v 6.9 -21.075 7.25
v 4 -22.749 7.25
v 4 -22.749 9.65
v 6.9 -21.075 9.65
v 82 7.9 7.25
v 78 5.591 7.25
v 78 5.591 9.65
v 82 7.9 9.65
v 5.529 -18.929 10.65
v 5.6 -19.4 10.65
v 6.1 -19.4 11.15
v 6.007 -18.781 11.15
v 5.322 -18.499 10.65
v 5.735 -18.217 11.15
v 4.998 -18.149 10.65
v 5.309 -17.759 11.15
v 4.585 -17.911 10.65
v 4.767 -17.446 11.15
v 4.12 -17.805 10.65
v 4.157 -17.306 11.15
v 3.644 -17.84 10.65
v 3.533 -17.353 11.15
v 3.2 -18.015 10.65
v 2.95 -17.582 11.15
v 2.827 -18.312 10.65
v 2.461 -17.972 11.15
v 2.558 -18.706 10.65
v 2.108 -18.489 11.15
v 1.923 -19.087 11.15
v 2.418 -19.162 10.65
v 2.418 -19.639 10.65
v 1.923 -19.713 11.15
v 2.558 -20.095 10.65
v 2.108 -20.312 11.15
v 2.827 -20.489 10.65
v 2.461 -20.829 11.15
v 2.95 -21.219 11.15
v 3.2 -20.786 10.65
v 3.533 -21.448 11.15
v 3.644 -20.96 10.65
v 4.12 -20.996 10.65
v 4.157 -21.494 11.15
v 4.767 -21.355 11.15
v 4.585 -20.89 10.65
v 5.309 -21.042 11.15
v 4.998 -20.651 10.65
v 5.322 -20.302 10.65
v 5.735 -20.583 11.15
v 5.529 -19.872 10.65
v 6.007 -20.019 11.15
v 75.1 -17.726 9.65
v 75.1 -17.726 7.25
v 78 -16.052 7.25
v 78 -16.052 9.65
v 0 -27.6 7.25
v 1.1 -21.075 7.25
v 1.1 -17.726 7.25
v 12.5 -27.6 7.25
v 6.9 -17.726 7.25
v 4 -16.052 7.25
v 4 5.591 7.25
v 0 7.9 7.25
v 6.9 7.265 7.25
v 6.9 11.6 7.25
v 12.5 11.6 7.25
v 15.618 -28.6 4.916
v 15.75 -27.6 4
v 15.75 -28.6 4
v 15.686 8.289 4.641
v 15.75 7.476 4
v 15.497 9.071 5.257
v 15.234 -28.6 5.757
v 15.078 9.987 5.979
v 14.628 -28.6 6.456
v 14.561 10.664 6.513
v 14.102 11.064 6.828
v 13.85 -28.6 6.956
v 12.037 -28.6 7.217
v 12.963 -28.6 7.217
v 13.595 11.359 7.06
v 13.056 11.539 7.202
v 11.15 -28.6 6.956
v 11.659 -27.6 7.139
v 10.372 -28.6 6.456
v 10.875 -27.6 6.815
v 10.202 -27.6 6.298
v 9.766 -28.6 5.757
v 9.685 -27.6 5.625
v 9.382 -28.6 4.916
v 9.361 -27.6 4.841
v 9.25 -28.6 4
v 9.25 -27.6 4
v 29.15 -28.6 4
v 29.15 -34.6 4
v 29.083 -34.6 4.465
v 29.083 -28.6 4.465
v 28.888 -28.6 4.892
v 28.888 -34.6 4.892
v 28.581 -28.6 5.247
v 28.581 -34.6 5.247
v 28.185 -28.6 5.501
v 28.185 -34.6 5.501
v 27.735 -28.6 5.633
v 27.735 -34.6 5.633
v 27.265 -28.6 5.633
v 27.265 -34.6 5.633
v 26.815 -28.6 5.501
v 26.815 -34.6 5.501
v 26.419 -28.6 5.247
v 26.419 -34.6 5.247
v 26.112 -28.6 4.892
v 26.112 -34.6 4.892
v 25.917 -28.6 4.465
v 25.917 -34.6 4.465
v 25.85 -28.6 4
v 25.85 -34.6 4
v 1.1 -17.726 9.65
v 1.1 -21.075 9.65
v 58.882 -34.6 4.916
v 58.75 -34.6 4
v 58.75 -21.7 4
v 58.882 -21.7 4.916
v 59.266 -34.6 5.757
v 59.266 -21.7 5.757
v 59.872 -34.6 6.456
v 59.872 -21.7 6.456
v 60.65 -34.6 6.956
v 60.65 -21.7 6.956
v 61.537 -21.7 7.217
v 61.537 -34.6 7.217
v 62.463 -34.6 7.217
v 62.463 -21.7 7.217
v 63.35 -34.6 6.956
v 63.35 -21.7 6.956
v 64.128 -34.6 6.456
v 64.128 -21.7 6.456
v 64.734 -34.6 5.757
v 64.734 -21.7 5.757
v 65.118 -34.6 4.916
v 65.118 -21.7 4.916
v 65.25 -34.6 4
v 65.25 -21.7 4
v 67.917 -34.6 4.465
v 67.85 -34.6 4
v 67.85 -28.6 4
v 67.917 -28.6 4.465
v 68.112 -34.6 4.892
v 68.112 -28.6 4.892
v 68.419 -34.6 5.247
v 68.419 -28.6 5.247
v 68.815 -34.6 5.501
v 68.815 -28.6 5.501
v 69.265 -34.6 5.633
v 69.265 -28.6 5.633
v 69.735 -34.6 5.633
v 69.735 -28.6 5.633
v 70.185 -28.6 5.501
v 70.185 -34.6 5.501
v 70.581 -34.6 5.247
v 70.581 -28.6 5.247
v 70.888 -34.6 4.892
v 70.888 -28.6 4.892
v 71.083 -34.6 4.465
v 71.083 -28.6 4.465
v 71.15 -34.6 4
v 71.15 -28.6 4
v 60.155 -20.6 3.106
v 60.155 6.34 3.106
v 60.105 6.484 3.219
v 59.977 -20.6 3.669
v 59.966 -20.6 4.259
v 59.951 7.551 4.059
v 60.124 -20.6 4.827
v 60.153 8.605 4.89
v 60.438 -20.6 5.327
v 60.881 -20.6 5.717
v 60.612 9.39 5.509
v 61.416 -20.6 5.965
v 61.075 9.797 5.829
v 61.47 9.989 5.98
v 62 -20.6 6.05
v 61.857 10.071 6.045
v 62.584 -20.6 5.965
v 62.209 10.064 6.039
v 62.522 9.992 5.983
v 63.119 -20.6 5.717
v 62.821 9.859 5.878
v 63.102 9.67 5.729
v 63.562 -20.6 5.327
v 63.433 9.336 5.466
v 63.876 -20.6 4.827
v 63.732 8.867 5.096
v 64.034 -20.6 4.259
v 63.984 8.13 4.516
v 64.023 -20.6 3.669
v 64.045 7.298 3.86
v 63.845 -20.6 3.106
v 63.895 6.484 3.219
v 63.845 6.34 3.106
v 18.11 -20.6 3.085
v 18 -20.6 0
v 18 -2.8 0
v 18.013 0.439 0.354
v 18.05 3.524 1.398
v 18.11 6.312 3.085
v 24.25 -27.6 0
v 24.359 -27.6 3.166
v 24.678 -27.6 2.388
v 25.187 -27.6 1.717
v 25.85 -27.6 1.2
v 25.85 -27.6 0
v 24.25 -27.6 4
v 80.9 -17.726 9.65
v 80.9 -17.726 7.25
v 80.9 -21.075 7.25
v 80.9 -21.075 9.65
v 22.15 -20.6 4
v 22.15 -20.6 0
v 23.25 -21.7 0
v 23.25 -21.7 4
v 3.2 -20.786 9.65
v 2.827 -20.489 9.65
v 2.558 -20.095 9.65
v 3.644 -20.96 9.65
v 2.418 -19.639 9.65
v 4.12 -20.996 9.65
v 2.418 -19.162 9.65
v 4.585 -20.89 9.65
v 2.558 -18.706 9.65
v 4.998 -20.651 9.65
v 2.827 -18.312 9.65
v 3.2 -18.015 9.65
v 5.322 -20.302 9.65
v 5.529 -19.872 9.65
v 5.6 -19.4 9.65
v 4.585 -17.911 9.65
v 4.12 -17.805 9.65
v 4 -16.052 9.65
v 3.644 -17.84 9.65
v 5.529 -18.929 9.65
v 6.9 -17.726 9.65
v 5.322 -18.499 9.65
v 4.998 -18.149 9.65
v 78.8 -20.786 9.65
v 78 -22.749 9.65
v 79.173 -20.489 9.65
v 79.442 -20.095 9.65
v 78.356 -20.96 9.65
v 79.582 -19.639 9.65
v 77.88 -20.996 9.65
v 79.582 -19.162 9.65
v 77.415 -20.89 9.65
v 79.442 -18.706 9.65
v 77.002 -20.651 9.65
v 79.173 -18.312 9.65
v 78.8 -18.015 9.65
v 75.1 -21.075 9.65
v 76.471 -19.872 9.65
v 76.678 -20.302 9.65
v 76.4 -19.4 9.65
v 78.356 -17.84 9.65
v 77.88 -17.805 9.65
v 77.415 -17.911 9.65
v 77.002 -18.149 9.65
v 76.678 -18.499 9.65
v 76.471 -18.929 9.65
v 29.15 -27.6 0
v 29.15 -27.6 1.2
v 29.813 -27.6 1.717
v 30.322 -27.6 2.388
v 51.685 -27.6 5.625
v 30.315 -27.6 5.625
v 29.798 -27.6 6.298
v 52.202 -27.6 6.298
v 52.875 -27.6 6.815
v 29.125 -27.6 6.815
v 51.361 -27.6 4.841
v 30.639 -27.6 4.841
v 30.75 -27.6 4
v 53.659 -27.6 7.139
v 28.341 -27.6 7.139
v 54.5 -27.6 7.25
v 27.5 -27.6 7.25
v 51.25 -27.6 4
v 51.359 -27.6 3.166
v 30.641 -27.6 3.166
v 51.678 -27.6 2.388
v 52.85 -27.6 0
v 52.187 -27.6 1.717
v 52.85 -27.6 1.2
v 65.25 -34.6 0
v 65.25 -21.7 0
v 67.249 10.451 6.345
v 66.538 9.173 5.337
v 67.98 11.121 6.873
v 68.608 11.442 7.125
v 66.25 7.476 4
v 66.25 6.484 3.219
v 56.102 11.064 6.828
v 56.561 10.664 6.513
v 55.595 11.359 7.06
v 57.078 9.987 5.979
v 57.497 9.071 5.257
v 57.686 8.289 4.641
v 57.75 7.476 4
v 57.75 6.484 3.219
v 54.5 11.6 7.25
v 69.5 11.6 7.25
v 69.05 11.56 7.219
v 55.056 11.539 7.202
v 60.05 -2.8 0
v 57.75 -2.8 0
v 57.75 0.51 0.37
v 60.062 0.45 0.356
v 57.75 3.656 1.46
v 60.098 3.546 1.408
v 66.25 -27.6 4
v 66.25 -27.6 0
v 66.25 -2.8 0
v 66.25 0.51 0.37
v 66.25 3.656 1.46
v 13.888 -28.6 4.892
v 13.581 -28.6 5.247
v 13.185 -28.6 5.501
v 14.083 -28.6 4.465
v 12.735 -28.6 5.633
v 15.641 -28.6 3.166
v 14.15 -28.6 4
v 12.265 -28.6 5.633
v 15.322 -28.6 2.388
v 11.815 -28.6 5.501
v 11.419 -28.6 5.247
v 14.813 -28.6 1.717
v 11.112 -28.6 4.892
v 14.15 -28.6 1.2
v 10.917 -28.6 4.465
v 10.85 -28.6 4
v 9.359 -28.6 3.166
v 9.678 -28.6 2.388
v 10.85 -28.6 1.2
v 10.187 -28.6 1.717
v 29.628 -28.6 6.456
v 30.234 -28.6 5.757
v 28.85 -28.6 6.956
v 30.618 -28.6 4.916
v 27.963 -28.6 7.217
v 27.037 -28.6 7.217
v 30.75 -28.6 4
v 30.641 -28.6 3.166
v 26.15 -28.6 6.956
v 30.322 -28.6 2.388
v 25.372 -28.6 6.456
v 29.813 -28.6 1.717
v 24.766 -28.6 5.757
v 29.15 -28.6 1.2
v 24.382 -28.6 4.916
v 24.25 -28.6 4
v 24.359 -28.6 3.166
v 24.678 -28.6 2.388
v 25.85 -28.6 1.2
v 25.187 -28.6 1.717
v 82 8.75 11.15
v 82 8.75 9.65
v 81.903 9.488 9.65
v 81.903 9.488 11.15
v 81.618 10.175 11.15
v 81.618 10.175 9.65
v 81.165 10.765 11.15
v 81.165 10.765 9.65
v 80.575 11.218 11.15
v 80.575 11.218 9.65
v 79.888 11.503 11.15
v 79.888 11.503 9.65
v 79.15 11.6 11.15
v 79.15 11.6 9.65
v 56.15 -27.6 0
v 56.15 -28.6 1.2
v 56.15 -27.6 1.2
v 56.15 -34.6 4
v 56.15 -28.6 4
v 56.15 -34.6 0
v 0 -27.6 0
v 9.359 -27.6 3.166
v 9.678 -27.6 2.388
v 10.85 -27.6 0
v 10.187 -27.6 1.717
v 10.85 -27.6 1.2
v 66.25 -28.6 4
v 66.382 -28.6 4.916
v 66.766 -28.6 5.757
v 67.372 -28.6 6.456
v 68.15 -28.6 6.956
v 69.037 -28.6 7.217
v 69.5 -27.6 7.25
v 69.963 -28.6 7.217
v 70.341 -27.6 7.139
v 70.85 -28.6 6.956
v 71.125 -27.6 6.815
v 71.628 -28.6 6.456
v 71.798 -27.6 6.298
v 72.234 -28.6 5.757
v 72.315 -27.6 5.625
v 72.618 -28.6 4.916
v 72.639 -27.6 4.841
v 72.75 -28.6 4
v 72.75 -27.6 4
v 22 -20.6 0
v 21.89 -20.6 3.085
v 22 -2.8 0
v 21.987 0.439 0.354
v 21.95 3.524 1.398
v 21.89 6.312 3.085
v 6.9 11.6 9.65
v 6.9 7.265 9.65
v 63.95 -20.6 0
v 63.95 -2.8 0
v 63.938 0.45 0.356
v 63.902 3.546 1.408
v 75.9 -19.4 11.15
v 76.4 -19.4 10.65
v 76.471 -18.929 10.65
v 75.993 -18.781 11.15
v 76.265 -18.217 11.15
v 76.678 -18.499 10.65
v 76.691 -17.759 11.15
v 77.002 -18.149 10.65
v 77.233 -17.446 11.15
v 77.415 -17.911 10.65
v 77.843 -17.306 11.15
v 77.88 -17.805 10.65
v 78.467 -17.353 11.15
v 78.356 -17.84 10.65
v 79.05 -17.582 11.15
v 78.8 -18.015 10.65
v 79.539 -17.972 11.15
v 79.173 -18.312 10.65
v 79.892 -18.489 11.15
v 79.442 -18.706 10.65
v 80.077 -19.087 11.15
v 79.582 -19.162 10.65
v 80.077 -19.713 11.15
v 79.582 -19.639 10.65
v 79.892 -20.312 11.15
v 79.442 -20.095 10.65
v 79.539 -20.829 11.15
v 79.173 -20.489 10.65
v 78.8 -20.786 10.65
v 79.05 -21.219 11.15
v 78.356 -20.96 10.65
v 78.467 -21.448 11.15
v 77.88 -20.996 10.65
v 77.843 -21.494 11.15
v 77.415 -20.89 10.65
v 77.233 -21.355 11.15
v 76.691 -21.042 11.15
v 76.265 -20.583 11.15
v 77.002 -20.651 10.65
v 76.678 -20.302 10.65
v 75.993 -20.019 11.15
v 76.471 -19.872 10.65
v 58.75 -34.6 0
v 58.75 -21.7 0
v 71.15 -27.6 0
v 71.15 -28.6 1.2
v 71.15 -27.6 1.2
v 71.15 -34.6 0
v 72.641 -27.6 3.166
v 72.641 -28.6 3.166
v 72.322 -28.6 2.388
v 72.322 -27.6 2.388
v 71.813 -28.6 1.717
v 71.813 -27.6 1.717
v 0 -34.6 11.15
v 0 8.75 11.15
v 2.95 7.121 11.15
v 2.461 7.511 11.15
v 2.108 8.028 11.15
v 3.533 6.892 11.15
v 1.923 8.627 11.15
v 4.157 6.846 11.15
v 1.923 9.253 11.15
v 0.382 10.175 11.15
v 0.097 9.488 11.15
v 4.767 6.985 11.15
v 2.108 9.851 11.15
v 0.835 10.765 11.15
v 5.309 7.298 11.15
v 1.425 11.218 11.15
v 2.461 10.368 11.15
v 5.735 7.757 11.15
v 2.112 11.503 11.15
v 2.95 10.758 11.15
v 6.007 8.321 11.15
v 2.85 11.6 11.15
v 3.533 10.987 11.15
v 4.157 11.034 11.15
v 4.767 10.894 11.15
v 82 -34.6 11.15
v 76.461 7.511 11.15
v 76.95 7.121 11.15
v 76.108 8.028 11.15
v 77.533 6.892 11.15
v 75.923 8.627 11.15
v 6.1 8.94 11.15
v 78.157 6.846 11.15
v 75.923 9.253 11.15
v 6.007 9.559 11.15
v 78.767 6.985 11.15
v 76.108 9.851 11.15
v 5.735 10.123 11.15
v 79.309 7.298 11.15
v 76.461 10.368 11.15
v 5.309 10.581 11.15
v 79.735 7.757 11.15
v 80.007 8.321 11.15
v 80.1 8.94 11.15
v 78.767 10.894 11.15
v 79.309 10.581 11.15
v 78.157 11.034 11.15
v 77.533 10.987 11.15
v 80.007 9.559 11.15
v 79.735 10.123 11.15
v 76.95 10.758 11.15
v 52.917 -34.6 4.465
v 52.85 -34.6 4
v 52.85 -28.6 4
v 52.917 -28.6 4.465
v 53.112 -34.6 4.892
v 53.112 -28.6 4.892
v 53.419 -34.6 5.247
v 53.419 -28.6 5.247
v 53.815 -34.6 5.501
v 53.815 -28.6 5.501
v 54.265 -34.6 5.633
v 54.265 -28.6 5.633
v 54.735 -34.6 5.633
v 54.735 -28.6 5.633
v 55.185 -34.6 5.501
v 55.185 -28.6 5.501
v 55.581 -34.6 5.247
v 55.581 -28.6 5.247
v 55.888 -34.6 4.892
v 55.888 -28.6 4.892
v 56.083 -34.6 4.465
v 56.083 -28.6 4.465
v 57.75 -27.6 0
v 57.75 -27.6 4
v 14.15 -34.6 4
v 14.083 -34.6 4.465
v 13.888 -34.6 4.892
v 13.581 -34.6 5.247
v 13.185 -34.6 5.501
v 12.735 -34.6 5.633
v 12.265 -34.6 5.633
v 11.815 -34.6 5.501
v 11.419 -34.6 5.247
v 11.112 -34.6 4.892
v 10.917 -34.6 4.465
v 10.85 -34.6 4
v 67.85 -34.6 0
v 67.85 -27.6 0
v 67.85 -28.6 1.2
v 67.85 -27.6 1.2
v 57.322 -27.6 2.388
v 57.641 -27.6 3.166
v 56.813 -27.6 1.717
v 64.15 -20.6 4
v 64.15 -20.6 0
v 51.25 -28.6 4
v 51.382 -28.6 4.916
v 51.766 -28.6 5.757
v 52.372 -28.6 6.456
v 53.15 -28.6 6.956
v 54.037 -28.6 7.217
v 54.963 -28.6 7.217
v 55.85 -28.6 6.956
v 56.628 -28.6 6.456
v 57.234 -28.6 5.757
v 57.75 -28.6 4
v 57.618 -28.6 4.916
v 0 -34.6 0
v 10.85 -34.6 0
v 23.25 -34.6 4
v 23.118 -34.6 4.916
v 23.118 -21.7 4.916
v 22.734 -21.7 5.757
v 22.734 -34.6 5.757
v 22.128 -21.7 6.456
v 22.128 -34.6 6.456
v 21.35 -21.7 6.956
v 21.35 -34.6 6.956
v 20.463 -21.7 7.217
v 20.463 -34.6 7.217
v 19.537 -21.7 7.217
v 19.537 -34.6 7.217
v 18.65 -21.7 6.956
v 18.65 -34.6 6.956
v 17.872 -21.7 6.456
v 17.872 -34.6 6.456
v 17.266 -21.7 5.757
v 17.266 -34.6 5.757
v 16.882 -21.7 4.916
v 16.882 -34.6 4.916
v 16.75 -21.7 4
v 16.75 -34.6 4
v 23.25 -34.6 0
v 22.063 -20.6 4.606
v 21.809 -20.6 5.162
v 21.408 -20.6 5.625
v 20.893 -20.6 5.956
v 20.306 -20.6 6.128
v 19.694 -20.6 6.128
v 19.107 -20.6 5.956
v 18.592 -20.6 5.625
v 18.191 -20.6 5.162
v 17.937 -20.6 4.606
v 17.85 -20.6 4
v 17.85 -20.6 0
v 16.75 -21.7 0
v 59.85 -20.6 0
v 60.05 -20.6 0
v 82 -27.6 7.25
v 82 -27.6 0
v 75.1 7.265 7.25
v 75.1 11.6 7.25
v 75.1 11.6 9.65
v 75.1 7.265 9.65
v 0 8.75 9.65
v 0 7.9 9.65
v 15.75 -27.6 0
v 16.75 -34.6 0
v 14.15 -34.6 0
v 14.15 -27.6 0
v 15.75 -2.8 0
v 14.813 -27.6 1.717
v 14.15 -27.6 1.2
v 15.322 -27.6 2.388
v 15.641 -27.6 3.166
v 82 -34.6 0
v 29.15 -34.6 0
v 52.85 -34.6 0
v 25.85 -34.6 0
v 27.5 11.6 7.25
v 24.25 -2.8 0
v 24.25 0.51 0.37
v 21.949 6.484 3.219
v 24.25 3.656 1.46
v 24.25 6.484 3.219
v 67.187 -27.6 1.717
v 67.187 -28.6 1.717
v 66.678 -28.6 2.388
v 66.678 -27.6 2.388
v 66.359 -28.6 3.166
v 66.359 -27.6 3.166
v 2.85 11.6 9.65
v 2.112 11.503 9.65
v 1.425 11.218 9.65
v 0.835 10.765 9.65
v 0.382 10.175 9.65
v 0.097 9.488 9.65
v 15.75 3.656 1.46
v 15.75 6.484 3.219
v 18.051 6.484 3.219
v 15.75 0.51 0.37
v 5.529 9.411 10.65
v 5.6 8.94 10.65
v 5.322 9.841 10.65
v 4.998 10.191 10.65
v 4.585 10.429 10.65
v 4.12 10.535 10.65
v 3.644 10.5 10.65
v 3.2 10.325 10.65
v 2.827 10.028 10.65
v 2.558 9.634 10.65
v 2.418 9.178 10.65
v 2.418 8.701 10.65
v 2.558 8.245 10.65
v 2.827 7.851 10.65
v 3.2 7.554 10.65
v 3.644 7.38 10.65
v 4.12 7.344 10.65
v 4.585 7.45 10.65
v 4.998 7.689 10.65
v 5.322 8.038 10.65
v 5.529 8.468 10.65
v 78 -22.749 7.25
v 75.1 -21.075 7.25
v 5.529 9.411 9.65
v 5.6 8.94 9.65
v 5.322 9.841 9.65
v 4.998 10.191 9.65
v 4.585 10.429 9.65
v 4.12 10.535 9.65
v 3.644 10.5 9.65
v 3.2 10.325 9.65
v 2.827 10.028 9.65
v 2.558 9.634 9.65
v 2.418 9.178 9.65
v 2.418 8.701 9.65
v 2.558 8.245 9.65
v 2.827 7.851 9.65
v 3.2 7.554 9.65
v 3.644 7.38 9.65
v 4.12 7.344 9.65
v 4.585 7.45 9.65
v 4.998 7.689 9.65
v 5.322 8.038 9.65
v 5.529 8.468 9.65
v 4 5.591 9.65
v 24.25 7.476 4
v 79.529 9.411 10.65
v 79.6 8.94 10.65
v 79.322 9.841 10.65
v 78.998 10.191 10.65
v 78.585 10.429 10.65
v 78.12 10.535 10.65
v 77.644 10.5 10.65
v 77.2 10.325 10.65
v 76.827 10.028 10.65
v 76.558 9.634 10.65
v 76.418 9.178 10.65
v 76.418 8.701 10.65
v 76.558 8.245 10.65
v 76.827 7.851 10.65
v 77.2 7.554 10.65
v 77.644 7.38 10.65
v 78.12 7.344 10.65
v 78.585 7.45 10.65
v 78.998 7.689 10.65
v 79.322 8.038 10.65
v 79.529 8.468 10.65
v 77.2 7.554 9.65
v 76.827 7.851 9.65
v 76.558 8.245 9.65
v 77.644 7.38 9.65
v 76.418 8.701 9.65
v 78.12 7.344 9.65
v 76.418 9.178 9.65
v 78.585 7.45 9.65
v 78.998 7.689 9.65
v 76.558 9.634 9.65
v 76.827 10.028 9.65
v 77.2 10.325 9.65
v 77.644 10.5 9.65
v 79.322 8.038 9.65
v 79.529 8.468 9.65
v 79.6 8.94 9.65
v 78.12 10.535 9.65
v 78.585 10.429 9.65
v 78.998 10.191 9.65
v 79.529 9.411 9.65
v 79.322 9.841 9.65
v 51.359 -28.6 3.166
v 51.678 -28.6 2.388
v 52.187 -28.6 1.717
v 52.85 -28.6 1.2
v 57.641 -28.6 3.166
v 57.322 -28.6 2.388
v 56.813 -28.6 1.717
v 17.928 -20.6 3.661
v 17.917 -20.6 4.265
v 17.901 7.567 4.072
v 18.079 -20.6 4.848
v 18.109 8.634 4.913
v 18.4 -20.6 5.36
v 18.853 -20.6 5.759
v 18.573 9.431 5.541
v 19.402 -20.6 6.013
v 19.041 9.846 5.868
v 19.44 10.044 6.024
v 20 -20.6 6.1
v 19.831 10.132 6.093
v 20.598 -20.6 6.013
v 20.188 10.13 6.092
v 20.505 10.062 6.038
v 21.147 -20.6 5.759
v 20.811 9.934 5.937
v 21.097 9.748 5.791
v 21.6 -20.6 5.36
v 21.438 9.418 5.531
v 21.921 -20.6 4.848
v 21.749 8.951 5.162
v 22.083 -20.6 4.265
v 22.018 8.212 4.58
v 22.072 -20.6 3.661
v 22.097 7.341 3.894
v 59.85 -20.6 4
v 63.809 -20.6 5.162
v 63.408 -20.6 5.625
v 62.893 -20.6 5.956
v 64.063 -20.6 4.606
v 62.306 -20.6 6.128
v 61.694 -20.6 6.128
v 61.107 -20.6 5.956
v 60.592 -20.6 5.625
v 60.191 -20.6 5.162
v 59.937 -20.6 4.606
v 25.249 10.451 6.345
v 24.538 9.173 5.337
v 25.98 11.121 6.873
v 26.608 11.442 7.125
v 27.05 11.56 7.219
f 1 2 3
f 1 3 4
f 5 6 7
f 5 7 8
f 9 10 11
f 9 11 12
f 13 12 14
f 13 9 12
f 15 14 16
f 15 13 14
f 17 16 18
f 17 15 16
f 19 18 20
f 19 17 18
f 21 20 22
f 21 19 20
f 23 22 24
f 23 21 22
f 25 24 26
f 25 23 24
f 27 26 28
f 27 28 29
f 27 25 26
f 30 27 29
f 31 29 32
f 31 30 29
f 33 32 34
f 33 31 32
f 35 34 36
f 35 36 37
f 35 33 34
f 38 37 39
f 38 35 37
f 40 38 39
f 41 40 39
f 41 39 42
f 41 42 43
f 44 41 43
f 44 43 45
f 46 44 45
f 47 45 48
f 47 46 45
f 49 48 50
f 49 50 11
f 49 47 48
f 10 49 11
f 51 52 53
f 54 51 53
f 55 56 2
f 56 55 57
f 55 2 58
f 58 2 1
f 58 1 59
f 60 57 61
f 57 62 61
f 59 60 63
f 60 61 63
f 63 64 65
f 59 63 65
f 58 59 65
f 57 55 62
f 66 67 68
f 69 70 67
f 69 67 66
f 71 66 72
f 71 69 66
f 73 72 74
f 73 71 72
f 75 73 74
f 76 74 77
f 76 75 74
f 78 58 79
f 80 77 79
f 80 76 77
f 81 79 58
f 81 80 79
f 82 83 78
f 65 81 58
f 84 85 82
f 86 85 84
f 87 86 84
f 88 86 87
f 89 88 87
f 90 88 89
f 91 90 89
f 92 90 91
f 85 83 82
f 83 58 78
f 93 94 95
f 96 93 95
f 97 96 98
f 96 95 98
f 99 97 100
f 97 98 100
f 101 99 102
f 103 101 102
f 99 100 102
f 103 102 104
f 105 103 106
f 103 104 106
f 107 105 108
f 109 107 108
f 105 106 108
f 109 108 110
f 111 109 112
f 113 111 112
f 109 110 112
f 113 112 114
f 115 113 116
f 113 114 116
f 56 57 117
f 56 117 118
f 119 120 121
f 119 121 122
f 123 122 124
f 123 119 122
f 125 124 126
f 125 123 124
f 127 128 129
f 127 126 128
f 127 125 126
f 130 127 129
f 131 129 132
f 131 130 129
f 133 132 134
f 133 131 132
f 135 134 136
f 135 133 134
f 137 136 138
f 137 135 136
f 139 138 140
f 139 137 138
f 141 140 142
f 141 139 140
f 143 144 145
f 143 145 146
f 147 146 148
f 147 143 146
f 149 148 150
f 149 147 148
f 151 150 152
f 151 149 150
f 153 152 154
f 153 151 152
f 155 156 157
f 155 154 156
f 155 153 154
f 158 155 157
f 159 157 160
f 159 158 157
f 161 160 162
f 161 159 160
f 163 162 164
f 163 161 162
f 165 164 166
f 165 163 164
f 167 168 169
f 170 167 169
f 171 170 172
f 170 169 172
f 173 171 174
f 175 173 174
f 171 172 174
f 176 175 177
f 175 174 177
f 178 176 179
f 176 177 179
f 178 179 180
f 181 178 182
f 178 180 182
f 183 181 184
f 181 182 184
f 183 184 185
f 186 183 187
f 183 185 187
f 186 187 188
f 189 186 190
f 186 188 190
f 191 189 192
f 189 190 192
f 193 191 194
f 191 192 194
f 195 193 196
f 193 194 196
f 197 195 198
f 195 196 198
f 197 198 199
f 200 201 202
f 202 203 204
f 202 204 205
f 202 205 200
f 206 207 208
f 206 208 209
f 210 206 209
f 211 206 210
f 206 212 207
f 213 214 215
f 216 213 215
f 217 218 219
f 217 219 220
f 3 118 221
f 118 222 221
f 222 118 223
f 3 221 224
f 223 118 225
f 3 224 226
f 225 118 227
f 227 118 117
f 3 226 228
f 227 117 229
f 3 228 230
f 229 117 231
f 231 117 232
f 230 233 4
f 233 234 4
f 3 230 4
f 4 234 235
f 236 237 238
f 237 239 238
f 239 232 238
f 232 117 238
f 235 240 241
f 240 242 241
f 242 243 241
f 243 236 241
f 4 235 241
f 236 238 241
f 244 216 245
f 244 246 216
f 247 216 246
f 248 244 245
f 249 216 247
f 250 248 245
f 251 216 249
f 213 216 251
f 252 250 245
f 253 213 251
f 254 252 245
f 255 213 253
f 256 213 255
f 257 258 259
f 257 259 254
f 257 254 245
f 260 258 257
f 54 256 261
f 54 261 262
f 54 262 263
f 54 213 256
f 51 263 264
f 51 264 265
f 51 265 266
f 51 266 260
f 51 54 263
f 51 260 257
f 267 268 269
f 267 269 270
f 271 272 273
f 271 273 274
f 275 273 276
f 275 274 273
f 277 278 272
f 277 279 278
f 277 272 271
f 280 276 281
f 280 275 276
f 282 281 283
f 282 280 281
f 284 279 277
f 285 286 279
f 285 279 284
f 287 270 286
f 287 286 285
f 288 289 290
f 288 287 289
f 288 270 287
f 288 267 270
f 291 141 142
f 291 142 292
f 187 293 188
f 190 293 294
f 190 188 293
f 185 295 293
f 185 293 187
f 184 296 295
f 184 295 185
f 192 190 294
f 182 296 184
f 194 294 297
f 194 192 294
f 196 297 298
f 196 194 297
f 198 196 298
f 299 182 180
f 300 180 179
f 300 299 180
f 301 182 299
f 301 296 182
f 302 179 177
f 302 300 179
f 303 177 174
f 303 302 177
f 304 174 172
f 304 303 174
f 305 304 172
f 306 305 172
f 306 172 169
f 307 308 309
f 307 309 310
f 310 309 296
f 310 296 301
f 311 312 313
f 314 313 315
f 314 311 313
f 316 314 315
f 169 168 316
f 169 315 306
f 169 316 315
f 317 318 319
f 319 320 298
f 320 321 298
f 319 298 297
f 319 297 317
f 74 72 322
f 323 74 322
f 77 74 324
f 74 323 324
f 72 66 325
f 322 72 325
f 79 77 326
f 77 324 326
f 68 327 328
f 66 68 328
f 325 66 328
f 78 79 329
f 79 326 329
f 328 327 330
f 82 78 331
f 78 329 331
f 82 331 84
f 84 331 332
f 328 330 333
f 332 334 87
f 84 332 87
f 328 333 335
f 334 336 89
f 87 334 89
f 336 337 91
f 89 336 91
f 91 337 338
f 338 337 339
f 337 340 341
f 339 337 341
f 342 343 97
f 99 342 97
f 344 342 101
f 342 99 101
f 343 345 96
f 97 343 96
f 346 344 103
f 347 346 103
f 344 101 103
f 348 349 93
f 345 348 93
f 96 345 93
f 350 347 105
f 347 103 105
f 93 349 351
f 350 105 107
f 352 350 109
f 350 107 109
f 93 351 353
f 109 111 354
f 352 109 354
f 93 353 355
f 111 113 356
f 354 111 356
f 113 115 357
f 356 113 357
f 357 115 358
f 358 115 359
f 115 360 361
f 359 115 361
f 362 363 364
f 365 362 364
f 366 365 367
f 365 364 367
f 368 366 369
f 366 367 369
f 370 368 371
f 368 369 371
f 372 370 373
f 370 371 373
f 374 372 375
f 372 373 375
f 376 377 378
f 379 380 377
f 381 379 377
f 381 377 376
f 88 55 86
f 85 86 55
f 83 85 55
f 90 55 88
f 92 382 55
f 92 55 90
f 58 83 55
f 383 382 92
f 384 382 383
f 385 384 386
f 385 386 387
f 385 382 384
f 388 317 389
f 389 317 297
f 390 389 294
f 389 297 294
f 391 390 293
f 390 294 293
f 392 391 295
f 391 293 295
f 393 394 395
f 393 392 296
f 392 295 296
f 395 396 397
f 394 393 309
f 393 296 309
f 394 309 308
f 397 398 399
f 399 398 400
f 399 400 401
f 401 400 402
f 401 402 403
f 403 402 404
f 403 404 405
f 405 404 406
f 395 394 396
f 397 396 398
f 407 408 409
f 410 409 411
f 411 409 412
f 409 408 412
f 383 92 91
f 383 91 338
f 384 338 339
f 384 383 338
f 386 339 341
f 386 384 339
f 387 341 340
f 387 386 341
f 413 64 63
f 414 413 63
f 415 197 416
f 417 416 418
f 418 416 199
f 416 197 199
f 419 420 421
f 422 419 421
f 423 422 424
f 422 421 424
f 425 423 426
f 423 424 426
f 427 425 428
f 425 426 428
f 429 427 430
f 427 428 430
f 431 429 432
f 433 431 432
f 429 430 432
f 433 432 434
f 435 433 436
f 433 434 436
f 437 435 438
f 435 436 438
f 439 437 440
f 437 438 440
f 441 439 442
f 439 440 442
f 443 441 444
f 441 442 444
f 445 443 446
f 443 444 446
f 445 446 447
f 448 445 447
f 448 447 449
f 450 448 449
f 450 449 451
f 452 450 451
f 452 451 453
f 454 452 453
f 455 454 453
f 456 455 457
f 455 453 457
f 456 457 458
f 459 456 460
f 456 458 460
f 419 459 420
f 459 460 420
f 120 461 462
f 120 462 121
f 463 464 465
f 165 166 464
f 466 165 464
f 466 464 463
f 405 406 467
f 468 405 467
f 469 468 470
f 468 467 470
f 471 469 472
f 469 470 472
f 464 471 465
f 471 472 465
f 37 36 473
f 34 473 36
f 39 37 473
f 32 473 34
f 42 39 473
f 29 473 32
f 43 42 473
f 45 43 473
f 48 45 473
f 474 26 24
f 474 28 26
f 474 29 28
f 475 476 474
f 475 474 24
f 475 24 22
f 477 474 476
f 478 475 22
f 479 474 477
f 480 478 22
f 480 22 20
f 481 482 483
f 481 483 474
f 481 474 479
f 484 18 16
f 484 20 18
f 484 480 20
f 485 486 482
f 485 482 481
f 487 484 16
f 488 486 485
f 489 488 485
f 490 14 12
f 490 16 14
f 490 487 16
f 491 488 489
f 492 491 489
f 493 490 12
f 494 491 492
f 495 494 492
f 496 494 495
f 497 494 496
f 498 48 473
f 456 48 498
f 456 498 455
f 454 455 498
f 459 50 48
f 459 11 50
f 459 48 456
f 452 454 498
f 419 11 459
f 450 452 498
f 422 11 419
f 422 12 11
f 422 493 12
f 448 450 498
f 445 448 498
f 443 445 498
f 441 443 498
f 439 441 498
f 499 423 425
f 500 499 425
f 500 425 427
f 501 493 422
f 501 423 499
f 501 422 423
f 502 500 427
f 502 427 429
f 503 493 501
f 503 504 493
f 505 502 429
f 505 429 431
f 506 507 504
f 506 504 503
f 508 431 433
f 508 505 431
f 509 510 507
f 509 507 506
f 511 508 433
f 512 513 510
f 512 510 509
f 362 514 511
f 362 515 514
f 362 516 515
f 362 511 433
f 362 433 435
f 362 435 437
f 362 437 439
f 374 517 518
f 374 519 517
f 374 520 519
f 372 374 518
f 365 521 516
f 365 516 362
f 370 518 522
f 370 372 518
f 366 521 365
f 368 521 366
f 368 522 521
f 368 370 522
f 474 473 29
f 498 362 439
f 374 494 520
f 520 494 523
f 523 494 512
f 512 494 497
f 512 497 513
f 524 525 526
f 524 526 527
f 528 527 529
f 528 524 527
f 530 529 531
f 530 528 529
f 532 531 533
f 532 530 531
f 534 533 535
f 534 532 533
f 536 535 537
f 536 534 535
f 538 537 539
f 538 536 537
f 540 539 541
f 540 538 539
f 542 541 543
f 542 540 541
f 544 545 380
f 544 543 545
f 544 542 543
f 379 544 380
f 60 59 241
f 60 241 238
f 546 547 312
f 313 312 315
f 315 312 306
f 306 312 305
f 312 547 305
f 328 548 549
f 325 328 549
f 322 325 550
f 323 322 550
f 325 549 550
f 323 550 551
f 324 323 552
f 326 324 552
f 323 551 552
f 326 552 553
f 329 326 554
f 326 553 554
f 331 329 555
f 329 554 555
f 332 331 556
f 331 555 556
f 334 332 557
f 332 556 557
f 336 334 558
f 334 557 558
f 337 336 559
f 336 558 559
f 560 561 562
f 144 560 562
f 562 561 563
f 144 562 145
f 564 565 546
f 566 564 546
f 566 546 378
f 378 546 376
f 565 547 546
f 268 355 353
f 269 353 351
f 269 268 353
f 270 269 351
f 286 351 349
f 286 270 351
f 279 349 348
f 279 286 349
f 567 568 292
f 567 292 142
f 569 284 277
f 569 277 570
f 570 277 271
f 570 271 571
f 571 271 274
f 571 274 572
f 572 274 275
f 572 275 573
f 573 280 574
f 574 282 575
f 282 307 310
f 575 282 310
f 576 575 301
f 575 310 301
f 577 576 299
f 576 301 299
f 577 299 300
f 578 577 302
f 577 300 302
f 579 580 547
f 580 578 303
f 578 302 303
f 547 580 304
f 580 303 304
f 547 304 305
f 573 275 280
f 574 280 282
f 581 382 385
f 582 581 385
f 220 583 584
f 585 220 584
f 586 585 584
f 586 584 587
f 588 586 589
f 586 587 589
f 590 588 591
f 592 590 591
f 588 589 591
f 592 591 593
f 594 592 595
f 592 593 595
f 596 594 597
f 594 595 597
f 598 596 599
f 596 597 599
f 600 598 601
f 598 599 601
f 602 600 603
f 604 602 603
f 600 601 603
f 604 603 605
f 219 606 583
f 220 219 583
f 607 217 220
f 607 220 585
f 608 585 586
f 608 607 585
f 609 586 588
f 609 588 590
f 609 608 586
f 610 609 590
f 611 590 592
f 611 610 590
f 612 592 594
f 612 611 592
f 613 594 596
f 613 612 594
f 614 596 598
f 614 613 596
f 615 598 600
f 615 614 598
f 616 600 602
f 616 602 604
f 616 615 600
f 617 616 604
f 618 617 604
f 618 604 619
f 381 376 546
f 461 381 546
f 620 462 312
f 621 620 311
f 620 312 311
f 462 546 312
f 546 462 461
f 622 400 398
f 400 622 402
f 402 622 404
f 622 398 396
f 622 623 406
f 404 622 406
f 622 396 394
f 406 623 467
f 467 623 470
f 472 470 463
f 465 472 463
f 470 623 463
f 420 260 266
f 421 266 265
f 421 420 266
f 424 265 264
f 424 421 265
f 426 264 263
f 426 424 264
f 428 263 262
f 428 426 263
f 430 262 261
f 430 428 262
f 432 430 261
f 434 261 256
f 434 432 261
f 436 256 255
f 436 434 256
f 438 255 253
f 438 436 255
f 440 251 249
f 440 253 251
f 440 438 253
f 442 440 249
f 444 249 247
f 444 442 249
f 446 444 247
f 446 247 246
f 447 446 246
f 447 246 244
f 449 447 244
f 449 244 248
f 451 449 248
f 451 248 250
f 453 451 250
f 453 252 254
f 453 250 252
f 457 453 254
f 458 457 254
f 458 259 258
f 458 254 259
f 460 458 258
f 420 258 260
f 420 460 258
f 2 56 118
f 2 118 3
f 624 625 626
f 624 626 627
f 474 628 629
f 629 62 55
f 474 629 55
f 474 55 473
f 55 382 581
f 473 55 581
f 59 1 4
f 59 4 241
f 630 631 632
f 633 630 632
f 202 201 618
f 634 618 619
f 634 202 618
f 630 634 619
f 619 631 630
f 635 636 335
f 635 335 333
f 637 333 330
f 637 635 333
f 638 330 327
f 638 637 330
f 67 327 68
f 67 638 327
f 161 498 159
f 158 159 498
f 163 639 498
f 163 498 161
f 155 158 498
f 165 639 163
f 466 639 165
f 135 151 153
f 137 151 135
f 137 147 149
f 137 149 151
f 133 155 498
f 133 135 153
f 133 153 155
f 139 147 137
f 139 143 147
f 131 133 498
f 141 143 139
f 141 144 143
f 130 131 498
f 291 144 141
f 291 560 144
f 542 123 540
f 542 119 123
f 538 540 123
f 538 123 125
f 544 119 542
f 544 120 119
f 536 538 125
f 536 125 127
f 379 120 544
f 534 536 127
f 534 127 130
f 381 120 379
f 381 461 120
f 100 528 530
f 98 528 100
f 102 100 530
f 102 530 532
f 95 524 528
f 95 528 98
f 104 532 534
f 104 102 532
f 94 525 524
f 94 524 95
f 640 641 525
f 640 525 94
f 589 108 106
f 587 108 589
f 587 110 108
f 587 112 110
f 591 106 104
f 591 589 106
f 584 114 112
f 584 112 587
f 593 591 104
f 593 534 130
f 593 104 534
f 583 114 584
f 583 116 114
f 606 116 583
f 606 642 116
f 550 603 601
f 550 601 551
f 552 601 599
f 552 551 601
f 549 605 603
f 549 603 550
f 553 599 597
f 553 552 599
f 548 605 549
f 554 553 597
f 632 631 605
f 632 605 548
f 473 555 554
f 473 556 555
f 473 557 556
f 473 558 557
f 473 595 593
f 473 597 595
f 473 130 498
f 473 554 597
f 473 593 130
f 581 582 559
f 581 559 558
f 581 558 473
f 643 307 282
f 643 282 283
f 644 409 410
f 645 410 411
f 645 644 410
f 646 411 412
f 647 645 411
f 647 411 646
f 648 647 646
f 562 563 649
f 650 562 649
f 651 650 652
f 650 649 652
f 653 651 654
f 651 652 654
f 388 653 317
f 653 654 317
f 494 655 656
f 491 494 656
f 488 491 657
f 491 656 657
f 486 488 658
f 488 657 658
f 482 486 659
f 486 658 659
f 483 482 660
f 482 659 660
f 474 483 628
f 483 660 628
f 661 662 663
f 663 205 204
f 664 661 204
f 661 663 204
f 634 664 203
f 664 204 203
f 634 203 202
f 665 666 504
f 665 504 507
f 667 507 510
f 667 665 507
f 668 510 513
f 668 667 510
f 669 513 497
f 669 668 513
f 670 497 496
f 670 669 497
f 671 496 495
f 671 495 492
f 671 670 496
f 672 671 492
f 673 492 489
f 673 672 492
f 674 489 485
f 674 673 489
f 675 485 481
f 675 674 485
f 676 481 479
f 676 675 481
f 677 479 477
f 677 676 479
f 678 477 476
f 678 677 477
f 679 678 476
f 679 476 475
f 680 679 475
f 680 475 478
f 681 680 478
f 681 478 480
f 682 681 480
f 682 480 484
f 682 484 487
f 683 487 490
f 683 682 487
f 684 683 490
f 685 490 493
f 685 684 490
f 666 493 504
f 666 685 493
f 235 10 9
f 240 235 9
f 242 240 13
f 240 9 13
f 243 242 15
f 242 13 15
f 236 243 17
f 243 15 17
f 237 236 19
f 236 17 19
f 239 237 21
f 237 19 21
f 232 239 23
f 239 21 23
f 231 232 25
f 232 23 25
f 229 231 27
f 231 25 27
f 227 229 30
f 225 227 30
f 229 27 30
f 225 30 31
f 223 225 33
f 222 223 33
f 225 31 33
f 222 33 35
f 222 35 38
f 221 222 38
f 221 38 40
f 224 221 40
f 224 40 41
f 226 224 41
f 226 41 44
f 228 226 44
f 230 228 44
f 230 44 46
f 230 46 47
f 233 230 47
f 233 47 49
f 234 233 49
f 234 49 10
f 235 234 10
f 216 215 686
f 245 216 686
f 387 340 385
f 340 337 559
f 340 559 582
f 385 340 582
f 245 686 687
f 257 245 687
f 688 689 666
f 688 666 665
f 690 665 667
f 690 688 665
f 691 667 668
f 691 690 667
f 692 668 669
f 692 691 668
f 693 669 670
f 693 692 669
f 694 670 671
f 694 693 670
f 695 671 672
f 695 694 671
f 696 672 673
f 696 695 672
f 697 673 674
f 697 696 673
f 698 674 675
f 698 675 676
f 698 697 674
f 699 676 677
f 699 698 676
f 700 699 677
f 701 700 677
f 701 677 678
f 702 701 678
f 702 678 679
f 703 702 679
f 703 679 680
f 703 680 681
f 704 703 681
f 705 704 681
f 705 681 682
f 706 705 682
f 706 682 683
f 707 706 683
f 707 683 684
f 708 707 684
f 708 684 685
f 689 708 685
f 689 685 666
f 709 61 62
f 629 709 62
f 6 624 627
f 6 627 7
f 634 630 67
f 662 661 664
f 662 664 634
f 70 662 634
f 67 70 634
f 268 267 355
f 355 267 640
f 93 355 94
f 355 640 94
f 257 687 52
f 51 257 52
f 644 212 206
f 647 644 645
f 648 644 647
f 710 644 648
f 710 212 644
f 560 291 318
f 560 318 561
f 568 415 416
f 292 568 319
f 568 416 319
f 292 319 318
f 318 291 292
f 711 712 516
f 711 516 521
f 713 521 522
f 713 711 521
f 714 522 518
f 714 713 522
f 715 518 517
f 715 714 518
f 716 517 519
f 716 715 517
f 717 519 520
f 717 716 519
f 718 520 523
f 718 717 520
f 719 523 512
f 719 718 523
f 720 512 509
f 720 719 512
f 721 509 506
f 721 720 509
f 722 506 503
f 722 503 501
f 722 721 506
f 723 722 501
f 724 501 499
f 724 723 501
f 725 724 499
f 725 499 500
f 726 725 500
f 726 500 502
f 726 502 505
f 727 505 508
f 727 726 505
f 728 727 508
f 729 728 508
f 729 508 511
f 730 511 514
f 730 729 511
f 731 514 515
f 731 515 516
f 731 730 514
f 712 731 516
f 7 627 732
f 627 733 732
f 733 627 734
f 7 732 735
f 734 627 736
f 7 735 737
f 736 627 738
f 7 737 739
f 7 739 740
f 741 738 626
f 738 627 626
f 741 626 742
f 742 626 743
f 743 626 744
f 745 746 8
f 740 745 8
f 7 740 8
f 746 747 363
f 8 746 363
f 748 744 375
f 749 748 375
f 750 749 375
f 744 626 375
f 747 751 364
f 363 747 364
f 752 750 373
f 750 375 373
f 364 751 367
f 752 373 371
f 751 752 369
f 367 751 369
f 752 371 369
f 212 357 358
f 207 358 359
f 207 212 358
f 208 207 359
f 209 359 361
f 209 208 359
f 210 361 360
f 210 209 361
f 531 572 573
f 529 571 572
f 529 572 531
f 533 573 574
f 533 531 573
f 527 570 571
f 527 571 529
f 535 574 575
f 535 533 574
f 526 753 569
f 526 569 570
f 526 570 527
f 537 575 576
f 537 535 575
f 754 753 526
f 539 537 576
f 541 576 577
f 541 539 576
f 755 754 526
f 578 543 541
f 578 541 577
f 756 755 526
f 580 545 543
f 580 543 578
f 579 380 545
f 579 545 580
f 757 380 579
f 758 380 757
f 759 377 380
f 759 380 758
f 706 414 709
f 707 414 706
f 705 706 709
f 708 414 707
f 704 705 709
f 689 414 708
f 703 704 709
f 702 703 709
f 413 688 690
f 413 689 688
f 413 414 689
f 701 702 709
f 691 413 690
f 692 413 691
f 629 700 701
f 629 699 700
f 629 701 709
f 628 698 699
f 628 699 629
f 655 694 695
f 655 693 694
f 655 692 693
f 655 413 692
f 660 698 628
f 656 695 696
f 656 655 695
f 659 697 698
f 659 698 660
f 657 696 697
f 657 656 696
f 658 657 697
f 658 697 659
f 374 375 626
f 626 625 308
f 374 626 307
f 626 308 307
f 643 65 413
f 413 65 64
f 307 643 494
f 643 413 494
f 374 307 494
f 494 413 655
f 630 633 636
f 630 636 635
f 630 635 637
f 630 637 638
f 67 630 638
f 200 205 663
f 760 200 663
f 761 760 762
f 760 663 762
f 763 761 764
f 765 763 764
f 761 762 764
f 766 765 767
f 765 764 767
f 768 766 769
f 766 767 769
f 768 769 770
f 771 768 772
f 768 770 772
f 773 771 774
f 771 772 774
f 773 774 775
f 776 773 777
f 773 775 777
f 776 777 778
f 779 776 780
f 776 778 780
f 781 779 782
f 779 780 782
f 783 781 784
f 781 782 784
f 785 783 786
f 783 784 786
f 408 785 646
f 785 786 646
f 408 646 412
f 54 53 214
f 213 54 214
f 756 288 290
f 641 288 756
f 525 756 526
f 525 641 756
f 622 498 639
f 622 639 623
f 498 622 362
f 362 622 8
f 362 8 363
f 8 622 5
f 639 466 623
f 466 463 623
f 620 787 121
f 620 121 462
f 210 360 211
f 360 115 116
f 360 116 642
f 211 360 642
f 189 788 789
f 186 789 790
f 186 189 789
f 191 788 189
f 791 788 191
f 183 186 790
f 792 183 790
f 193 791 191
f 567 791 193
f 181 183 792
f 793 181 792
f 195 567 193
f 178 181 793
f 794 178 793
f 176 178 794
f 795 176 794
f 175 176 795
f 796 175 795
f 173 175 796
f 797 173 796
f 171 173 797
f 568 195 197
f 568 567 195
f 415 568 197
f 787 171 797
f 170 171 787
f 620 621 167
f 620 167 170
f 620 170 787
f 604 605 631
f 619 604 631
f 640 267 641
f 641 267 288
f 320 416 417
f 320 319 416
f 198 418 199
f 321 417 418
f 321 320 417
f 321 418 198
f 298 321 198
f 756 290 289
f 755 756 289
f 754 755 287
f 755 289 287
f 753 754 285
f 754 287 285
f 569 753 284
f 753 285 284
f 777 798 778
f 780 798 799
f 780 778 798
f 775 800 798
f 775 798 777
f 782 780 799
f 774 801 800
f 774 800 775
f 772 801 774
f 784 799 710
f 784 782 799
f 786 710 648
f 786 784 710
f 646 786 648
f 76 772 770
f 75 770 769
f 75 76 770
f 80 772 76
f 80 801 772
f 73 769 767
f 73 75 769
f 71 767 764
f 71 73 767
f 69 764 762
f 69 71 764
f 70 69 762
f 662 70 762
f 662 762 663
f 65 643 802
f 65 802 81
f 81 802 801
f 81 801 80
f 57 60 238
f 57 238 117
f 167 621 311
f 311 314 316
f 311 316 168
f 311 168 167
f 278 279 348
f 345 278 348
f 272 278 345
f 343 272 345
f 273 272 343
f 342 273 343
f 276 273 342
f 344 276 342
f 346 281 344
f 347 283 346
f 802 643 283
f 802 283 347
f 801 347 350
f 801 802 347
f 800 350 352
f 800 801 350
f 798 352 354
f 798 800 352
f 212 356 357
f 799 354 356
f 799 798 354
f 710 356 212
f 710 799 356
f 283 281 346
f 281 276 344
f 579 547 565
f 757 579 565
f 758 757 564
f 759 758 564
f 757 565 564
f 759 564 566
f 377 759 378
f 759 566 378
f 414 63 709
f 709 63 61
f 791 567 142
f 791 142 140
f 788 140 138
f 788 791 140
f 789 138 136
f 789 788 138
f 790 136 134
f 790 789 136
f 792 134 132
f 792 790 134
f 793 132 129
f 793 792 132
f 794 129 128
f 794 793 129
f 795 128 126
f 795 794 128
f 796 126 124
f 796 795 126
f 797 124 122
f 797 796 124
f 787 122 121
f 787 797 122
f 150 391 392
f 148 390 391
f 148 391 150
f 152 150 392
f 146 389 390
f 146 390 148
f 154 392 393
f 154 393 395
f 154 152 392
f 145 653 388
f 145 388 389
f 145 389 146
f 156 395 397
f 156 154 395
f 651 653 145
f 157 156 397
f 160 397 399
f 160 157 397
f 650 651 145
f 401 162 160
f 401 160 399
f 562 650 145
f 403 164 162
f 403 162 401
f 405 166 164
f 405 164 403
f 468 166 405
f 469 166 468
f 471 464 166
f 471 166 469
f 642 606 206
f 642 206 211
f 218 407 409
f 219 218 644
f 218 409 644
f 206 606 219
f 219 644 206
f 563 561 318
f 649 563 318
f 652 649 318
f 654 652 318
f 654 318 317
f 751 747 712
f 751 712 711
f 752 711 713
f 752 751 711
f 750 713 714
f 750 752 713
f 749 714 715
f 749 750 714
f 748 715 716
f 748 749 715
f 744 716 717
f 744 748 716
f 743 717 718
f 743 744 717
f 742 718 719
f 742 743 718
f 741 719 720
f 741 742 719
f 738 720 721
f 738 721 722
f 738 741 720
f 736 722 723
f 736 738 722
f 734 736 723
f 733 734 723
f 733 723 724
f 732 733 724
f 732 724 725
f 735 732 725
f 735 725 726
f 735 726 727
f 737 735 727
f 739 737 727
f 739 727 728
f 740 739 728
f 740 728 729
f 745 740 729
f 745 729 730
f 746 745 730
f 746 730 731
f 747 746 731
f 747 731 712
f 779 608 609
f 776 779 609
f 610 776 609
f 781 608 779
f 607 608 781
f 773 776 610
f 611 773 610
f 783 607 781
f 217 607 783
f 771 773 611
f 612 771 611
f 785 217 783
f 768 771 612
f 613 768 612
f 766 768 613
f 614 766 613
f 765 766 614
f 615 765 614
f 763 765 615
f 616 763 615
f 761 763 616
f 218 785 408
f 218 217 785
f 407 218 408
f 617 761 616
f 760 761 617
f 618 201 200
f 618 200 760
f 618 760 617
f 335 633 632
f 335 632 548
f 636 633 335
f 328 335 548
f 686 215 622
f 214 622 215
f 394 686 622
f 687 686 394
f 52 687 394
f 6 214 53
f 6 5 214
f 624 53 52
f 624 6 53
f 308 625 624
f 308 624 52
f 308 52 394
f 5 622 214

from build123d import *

# Parameters (mm, degrees)
SKETCH1_R                = 1.6
BOSS_EXTRUDE1_DEPTH      = 11.15
SKETCH2_W                = 82
SKETCH2_H                = 0.6
CUT_EXTRUDE1_DEPTH       = 8
CUT_EXTRUDE2_DEPTH       = 46.2
CUT_EXTRUDE3_DEPTH       = 40.2
CUT_EXTRUDE5_DEPTH       = 39.2
BOSS_EXTRUDE2_DEPTH      = 32.2
CHAMFER3_SIZE            = 1.1
CHAMFER4_SIZE            = 1.1
CUT_EXTRUDE12_DEPTH      = 1
CUT_EXTRUDE12_DEPTH_BACK = 83
FILLET3_R                = 15
SKETCH14_R               = 1.6
CUT_EXTRUDE14_DEPTH      = 12.1500001
BOSS_EXTRUDE3_DEPTH      = 3.5
SKETCH8_W                = 82
SKETCH8_H                = 0.6
CUT_EXTRUDE16_DEPTH      = 4.15
CUT_EXTRUDE17_DEPTH      = 2.4
CHAMFER5_SIZE            = 0.5


with BuildPart() as part:
    # Sketch1 → Boss-Extrude1 (new body)
    with BuildSketch(Plane.XY):
        with BuildLine():
            Line((0, -35.2), (82, -35.2))
            Line((82, -35.2), (82, 8.75))
            ThreePointArc((82, 8.75), (81.165254326, 10.765254326), (79.15, 11.6))
            Line((79.15, 11.6), (2.85, 11.6))
            ThreePointArc((2.85, 11.6), (0.834745674, 10.765254326), (0, 8.75))
            Line((0, 8.75), (0, -35.2))
        make_face()
        with Locations((4, 8.939640599)):
            Circle(SKETCH1_R, mode=Mode.SUBTRACT)
        with Locations((78, 8.939640599)):
            Circle(SKETCH1_R, mode=Mode.SUBTRACT)
    extrude(amount=BOSS_EXTRUDE1_DEPTH)

    # Sketch2 → Cut-Extrude1 (cut)
    with BuildSketch(Plane(origin=(0, 0, 0), x_dir=(-1, 0, 0), z_dir=(0, 0, -1))):
        with Locations((-41, -34.9)):
            Rectangle(SKETCH2_W, SKETCH2_H)
    cut_extrude1 = extrude(amount=-CUT_EXTRUDE1_DEPTH, mode=Mode.SUBTRACT)

    # Sketch3 → Cut-Extrude2 (cut)
    with BuildSketch(Plane.XZ.offset(34.6)):
        with BuildLine():
            Line((25.85, 4), (25.85, 0))
            Line((25.85, 0), (29.15, 0))
            Line((29.15, 0), (29.15, 4))
            ThreePointArc((29.15, 4), (27.5, 5.65), (25.85, 4))
        make_face()
        with BuildLine():
            ThreePointArc((14.15, 4), (12.5, 5.65), (10.85, 4))
            Line((10.85, 4), (10.85, 0))
            Line((10.85, 0), (14.15, 0))
            Line((14.15, 0), (14.15, 4))
        make_face()
        with BuildLine():
            ThreePointArc((23.25, 4), (20, 7.25), (16.75, 4))
            Line((16.75, 4), (16.75, 0))
            Line((16.75, 0), (23.25, 0))
            Line((23.25, 0), (23.25, 4))
        make_face()
    cut_extrude2 = extrude(amount=-CUT_EXTRUDE2_DEPTH, mode=Mode.SUBTRACT)

    # Sketch4 → Cut-Extrude3 (cut)
    with BuildSketch(Plane(origin=(0, 11.6, 0), x_dir=(1, 0, 0), z_dir=(0, 1, 0))):
        with BuildLine():
            Line((9.25, -4), (9.25, 0))
            Line((9.25, 0), (15.75, 0))
            Line((15.75, 0), (15.75, -4))
            ThreePointArc((15.75, -4), (12.5, -7.25), (9.25, -4))
        make_face()
        with BuildLine():
            Line((24.25, -4), (24.25, 0))
            Line((24.25, 0), (30.75, 0))
            Line((30.75, 0), (30.75, -4))
            ThreePointArc((30.75, -4), (27.5, -7.25), (24.25, -4))
        make_face()
    cut_extrude3 = extrude(amount=-CUT_EXTRUDE3_DEPTH, mode=Mode.SUBTRACT)

    # Sketch6 → Cut-Extrude5 (cut)
    with BuildSketch(Plane(origin=(0, 11.6, 0), x_dir=(1, 0, 0), z_dir=(0, 1, 0))):
        with BuildLine():
            Line((15.75, -4), (15.75, 0))
            Line((15.75, 0), (15.75, 0.65176216))
            Line((15.75, 0.65176216), (0, 0.65176216))
            Line((0, 0.65176216), (0, -7.25))
            Line((0, -7.25), (12.5, -7.25))
            ThreePointArc((12.5, -7.25), (14.798097039, -6.298097039), (15.75, -4))
        make_face()
        with BuildLine():
            Line((24.25, 0), (24.25, -4))
            ThreePointArc((24.25, -4), (25.201902961, -6.298097039), (27.5, -7.25))
            Line((27.5, -7.25), (41, -7.25))
            Line((41, -7.25), (41, 0))
            Line((41, 0), (24.25, 0))
        make_face()
    cut_extrude5 = extrude(amount=-CUT_EXTRUDE5_DEPTH, mode=Mode.SUBTRACT)

    # Mirror1: Cut-Extrude1, Cut-Extrude2, Cut-Extrude3, Cut-Extrude5 across plane
    add(cut_extrude1.mirror(Plane.ZY.offset(-41)), mode=Mode.SUBTRACT)
    add(cut_extrude2.mirror(Plane.ZY.offset(-41)), mode=Mode.SUBTRACT)
    add(cut_extrude3.mirror(Plane.ZY.offset(-41)), mode=Mode.SUBTRACT)
    add(cut_extrude5.mirror(Plane.ZY.offset(-41)), mode=Mode.SUBTRACT)

    # Sketch12 → Boss-Extrude2 (add)
    with BuildSketch(Plane(origin=(0, 11.6, 0), x_dir=(1, 0, 0), z_dir=(0, 1, 0))):
        with BuildLine():
            Line((16.75, -4), (16.75, 0))
            Line((16.75, 0), (18, 0))
            Line((18, 0), (18.11, -3.084631222))
            ThreePointArc((18.11, -3.084631222), (20, -6.1), (21.89, -3.084631222))
            Line((21.89, -3.084631222), (22, 0))
            Line((22, 0), (23.25, 0))
            Line((23.25, 0), (23.25, -4))
            ThreePointArc((23.25, -4), (20, -7.25), (16.75, -4))
        make_face()
        with BuildLine():
            Line((58.75, -4), (58.75, 0))
            Line((58.75, 0), (60.05, 0))
            Line((60.05, 0), (60.155, -3.106425717))
            ThreePointArc((60.155, -3.106425717), (62, -6.05), (63.845, -3.106425717))
            Line((63.845, -3.106425717), (63.95, 0))
            Line((63.95, 0), (65.25, 0))
            Line((65.25, 0), (65.25, -4))
            ThreePointArc((65.25, -4), (62, -7.25), (58.75, -4))
        make_face()
    extrude(amount=-BOSS_EXTRUDE2_DEPTH)

    # Chamfer3
    chamfer3_edges = [part.edges().sort_by_distance(p)[0] for p in [
        (65.25, -20.6, 2),
        (58.75, -20.6, 2),
        (62, -20.6, 7.25),
    ]]
    chamfer(chamfer3_edges, length=CHAMFER3_SIZE)

    # Chamfer4
    chamfer4_edges = [part.edges().sort_by_distance(p)[0] for p in [
        (23.25, -20.6, 2),
        (16.75, -20.6, 2),
        (20, -20.6, 7.25),
    ]]
    chamfer(chamfer4_edges, length=CHAMFER4_SIZE)

    # Sketch9 → Cut-Extrude12 (cut, two sides)
    with BuildSketch(Plane.ZY) as cut_extrude12_sk:
        Polygon((-106.219800457, 11.6), (0, 11.6), (7.25, 11.6), (0, 2.4), (-65.744961499, -81.028089075), (-260.411588221, -166.089763625), (-300.886427179, -73.46167455), align=None)
    extrude(amount=CUT_EXTRUDE12_DEPTH, mode=Mode.SUBTRACT)
    extrude(cut_extrude12_sk.sketch, amount=-CUT_EXTRUDE12_DEPTH_BACK, mode=Mode.SUBTRACT)

    # Fillet3
    fillet3_edges = [part.edges().sort_by_distance(p)[0] for p in [
        (16.875, 2.4, 0),
        (23.125, 2.4, 0),
        (58.9, 2.4, 0),
        (65.1, 2.4, 0),
    ]]
    fillet(fillet3_edges, radius=FILLET3_R)

    # Sketch14 → Cut-Extrude14 (cut, through all)
    with BuildSketch(Plane.XY.offset(11.15)):
        with Locations((4, -19.400359401)):
            Circle(SKETCH14_R)
    cut_extrude14 = extrude(amount=-CUT_EXTRUDE14_DEPTH, mode=Mode.SUBTRACT)

    # Mirror3: Cut-Extrude14 across plane
    add(cut_extrude14.mirror(Plane.ZY.offset(-41)), mode=Mode.SUBTRACT)

    # Sketch18 → Boss-Extrude3 (add)
    with BuildSketch(Plane(origin=(0, -27.6, 0), x_dir=(1, 0, 0), z_dir=(0, 1, 0))):
        with BuildLine():
            Line((14.15, 0), (14.15, -1.2))
            ThreePointArc((14.15, -1.2), (15.321790212, -2.38754845), (15.75, -4))
            Line((15.75, -4), (15.75, 0))
            Line((15.75, 0), (14.15, 0))
        make_face()
        with BuildLine():
            Line((10.85, -1.2), (10.85, 0))
            Line((10.85, 0), (9.25, 0))
            Line((9.25, 0), (9.25, -4))
            ThreePointArc((9.25, -4), (9.678209788, -2.38754845), (10.85, -1.2))
        make_face()
        with BuildLine():
            Line((29.15, 0), (29.15, -1.2))
            ThreePointArc((29.15, -1.2), (30.321790212, -2.38754845), (30.75, -4))
            Line((30.75, -4), (30.75, 0))
            Line((30.75, 0), (29.15, 0))
        make_face()
        with BuildLine():
            Line((25.85, -1.2), (25.85, 0))
            Line((25.85, 0), (24.25, 0))
            Line((24.25, 0), (24.25, -4))
            ThreePointArc((24.25, -4), (24.678209788, -2.38754845), (25.85, -1.2))
        make_face()
    boss_extrude3 = extrude(amount=-BOSS_EXTRUDE3_DEPTH)

    # Mirror5: Boss-Extrude3 across plane
    add(boss_extrude3.mirror(Plane.ZY.offset(-41)))

    # Sketch8 → Cut-Extrude16 (cut, through all)
    with BuildSketch(Plane(origin=(0, 0, 8), x_dir=(-1, 0, 0), z_dir=(0, 0, -1))):
        with Locations((-41, -34.9)):
            Rectangle(SKETCH8_W, SKETCH8_H)
    extrude(amount=-CUT_EXTRUDE16_DEPTH, mode=Mode.SUBTRACT)

    # Sketch20 → Cut-Extrude17 (cut)
    with BuildSketch(Plane(origin=(0, 0, 7.25), x_dir=(-1, 0, 0), z_dir=(0, 0, -1))):
        Polygon((-80.9, 12.288272161), (-75.1, 12.288272161), (-75.1, 7.265324819), (-78, 5.591009038), (-84.071495483, 9.096388589), align=None)
        Polygon((-75.1, -21.074675181), (-75.1, -17.72604362), (-78, -16.051727839), (-80.9, -17.72604362), (-80.9, -21.074675181), (-78, -22.748990962), align=None)
    cut_extrude17 = extrude(amount=-CUT_EXTRUDE17_DEPTH, mode=Mode.SUBTRACT)

    # Mirror7: Cut-Extrude17 across plane
    add(cut_extrude17.mirror(Plane.ZY.offset(-41)), mode=Mode.SUBTRACT)

    # Chamfer5
    chamfer5_edges = [part.edges().sort_by_distance(p)[0] for p in [
        (2.4, 8.939640599, 11.15),
        (76.4, 8.939640599, 11.15),
        (2.4, -19.400359401, 11.15),
        (79.6, -19.400359401, 11.15),
    ]]
    chamfer(chamfer5_edges, length=CHAMFER5_SIZE)


solid = part.part
